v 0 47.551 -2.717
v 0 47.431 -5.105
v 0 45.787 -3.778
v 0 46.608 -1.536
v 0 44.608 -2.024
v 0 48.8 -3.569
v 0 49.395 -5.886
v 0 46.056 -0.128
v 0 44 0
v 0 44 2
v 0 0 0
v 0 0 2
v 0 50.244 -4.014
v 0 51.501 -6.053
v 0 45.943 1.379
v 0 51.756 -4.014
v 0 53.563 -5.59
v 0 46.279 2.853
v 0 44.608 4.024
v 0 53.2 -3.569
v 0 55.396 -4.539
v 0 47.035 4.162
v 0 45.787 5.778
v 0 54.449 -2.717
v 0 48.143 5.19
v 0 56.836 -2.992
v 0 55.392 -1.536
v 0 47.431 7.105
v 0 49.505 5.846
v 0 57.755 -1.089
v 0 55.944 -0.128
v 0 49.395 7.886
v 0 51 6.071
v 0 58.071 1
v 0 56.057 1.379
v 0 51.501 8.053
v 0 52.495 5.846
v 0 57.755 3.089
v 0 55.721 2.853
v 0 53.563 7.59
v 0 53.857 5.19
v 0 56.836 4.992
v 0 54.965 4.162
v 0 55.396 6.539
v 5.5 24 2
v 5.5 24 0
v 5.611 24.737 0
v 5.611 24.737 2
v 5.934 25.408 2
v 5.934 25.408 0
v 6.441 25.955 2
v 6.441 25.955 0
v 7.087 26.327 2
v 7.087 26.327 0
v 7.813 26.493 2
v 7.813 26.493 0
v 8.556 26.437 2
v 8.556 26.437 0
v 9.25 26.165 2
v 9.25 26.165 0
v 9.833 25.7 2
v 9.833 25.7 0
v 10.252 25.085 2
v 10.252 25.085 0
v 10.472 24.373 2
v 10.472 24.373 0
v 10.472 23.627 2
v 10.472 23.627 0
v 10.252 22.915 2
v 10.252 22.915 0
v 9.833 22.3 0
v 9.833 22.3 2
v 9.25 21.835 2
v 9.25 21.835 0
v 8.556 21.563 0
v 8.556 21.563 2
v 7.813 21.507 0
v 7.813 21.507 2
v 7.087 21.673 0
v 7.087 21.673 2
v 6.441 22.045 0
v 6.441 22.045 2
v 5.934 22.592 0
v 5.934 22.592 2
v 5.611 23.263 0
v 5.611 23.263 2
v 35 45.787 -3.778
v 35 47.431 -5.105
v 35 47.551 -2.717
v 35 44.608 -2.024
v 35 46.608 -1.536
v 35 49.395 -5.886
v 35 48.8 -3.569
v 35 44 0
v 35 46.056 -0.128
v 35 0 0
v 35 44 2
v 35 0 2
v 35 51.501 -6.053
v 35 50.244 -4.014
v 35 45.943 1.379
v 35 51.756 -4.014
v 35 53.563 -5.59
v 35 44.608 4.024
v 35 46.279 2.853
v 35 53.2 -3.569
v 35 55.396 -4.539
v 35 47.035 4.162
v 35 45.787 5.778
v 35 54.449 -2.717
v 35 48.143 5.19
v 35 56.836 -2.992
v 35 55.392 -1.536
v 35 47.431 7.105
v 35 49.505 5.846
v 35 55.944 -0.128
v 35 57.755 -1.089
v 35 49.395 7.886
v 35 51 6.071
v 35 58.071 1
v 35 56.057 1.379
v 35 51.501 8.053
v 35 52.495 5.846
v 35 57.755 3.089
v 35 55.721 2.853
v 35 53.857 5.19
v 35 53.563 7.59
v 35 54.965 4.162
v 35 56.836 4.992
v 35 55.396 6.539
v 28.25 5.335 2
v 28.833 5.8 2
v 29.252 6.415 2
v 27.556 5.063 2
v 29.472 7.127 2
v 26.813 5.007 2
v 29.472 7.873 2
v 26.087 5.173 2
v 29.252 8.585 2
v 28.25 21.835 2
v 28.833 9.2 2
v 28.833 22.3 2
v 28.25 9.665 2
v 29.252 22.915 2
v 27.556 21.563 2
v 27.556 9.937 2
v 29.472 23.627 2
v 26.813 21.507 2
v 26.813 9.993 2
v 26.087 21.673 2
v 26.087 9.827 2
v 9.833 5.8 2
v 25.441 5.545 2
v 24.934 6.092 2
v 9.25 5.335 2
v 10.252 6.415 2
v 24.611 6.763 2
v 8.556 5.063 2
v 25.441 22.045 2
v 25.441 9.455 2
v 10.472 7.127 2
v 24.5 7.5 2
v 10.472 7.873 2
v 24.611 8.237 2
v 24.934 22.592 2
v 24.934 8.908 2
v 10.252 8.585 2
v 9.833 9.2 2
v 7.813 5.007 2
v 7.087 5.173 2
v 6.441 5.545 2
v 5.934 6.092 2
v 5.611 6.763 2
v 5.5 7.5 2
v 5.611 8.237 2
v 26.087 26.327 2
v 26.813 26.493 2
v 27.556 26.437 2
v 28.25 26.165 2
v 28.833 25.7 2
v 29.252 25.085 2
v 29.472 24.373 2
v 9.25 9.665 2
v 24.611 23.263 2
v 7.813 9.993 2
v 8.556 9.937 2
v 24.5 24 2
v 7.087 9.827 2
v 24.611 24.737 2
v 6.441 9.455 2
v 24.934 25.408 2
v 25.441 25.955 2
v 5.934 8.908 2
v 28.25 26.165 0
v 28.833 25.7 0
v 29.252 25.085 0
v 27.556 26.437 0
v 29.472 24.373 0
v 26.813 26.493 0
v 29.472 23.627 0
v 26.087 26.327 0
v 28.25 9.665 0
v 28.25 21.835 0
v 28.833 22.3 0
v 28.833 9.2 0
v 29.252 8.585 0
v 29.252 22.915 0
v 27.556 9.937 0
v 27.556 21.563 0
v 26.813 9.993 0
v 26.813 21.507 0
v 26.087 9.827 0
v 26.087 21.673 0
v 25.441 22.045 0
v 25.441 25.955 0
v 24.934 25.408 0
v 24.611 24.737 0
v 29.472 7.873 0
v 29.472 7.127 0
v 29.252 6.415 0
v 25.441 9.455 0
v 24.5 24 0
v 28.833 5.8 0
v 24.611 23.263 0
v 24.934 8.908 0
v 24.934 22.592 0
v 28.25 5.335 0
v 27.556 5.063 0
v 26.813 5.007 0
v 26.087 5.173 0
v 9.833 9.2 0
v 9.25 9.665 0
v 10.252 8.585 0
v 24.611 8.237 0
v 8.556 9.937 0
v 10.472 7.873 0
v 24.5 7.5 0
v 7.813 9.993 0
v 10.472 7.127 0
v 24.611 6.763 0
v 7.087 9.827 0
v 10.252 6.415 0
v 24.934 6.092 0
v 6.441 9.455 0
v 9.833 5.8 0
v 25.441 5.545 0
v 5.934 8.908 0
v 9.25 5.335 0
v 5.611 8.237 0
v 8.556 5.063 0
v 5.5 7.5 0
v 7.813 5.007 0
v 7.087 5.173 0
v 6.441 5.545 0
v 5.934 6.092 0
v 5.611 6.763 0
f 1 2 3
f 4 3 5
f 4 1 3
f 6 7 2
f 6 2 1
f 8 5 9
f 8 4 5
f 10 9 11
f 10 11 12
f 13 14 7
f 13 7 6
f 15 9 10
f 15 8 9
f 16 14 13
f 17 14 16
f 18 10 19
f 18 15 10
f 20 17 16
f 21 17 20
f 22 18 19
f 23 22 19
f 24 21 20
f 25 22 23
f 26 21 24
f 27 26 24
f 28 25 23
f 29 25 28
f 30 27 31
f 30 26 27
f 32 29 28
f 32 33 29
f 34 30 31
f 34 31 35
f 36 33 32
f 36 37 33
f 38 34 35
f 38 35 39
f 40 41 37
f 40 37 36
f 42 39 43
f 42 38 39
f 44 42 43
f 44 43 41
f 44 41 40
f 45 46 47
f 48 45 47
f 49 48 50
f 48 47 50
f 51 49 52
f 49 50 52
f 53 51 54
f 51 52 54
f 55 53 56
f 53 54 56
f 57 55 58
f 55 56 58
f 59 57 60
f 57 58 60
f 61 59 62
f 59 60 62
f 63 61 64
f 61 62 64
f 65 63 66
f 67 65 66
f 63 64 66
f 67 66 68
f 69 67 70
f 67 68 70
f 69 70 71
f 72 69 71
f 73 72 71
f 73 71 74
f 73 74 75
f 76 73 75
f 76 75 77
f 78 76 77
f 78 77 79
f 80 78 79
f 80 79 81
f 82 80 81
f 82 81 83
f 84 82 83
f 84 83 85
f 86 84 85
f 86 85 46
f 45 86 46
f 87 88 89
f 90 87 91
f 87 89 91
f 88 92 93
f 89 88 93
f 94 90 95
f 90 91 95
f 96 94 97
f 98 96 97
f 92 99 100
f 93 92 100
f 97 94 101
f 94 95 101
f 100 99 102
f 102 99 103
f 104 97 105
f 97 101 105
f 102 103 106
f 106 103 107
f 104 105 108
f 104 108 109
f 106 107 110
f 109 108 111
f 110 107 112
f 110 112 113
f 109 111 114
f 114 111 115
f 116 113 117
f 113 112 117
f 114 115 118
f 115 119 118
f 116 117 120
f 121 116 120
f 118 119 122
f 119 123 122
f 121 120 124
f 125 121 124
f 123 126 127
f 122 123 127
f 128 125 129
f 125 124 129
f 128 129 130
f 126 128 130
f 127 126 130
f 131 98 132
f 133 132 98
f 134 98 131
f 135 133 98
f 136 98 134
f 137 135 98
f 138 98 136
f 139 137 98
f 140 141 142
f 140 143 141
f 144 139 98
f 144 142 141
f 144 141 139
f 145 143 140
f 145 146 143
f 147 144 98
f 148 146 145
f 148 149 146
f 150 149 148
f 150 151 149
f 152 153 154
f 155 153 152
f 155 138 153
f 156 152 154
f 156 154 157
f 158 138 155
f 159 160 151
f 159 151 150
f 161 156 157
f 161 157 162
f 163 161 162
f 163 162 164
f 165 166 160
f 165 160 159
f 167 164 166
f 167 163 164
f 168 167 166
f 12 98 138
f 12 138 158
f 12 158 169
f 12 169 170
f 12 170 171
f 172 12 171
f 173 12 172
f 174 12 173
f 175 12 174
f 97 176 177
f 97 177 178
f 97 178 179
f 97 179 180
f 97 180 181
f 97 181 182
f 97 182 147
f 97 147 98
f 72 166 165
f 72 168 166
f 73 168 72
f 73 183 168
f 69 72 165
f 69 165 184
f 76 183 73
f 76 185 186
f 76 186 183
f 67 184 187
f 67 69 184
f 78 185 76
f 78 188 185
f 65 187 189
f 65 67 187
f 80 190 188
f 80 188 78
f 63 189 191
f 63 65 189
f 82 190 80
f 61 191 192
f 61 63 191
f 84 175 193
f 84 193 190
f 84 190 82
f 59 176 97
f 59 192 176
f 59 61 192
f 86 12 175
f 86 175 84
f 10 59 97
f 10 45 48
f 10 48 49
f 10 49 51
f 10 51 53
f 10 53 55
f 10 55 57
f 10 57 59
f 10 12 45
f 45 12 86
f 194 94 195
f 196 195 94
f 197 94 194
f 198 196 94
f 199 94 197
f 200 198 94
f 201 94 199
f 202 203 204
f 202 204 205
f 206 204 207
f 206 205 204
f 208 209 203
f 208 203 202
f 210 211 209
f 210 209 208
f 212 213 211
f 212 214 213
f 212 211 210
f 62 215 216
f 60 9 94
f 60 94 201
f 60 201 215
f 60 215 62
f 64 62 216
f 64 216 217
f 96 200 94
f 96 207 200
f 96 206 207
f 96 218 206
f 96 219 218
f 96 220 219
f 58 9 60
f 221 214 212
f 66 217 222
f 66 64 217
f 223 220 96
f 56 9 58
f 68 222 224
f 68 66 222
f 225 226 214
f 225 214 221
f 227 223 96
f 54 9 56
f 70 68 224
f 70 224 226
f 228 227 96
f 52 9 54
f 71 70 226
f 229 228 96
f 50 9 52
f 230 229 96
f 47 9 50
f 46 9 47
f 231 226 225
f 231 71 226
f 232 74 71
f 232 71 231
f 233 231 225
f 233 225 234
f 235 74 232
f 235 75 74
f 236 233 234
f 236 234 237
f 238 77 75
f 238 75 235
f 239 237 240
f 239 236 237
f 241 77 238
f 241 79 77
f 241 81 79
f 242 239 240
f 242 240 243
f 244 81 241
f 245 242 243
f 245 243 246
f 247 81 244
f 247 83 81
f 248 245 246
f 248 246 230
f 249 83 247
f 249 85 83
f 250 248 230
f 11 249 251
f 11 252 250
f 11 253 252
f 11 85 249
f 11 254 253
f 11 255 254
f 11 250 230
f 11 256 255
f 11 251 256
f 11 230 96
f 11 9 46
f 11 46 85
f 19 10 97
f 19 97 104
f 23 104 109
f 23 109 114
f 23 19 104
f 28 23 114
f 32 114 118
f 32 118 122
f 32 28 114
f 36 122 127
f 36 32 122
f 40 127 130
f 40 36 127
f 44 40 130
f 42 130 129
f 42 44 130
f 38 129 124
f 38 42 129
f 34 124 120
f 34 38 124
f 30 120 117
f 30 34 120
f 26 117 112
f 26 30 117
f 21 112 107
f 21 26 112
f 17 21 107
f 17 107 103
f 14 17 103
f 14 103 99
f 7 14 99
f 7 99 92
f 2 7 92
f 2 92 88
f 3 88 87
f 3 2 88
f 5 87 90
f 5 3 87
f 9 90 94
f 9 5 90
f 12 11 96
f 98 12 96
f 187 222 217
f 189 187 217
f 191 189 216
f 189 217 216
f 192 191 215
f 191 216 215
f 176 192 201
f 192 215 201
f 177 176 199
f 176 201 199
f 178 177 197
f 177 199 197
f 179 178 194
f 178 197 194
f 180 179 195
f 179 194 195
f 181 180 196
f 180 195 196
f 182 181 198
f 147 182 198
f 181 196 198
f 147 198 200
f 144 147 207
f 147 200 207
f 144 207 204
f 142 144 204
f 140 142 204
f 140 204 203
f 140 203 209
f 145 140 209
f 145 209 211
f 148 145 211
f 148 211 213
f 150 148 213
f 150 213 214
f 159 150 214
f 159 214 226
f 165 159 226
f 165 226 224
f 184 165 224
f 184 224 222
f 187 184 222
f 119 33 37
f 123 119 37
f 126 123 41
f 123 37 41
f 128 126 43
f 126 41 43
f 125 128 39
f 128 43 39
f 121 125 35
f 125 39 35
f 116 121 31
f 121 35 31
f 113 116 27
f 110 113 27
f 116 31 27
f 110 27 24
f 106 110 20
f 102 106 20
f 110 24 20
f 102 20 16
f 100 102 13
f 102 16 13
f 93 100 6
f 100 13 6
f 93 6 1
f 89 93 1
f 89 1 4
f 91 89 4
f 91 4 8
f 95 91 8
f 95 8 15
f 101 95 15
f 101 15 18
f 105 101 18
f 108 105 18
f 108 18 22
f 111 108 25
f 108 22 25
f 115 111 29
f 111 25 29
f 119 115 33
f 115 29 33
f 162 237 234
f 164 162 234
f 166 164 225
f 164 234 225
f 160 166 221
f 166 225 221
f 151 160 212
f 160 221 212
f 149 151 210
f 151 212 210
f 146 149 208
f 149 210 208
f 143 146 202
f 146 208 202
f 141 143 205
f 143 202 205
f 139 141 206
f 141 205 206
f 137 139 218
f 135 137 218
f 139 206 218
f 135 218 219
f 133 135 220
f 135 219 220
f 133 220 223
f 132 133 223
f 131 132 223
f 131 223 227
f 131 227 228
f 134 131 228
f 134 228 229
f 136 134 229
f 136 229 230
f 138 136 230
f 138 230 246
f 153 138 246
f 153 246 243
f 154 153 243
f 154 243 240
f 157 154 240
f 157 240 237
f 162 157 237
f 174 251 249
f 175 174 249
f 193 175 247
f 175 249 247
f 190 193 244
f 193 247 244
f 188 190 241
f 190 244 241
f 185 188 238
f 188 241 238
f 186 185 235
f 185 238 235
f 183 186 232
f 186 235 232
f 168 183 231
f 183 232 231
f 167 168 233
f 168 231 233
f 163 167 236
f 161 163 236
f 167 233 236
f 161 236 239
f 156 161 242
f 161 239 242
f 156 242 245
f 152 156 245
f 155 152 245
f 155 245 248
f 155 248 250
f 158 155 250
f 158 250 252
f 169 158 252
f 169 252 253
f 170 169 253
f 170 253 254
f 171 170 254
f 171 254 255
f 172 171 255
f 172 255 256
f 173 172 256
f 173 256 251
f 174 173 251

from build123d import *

# Parameters (mm, degrees)
SKETCH1_W           = 35
SKETCH1_H           = 40
BOSS_EXTRUDE1_DEPTH = 2
SKETCH2_R           = 2.5
CUT_EXTRUDE1_DEPTH  = 54.188344588
SKETCH3_R           = 5.071067812
BOSS_EXTRUDE2_DEPTH = 35


with BuildPart() as part:
    # Sketch1 → Boss-Extrude1 (new body)
    with BuildSketch(Plane.XY):
        with Locations((17.5, 20)):
            Rectangle(SKETCH1_W, SKETCH1_H)
    extrude(amount=BOSS_EXTRUDE1_DEPTH)

    # Sketch2 → Cut-Extrude1 (cut, through all)
    with BuildSketch(Plane(origin=(0, 0, 0), x_dir=(-1, 0, 0), z_dir=(0, 0, -1))):
        with Locations((-27, 24)):
            Circle(SKETCH2_R)
        with Locations((-8, 24)):
            Circle(SKETCH2_R)
        with Locations((-8, 7.5)):
            Circle(SKETCH2_R)
        with Locations((-27, 7.5)):
            Circle(SKETCH2_R)
    extrude(amount=-CUT_EXTRUDE1_DEPTH, mode=Mode.SUBTRACT)

    # Sketch3 → Boss-Extrude2 (add)
    with BuildSketch(Plane.ZY):
        with BuildLine():
            Line((0, 40), (2, 40))
            Line((2, 40), (2, 44))
            ThreePointArc((2, 44), (1, 58.071067812), (0, 44))
            Line((0, 44), (0, 40))
        make_face()
        with Locations((1, 51)):
            Circle(SKETCH3_R, mode=Mode.SUBTRACT)
    extrude(amount=-BOSS_EXTRUDE2_DEPTH)


solid = part.part
